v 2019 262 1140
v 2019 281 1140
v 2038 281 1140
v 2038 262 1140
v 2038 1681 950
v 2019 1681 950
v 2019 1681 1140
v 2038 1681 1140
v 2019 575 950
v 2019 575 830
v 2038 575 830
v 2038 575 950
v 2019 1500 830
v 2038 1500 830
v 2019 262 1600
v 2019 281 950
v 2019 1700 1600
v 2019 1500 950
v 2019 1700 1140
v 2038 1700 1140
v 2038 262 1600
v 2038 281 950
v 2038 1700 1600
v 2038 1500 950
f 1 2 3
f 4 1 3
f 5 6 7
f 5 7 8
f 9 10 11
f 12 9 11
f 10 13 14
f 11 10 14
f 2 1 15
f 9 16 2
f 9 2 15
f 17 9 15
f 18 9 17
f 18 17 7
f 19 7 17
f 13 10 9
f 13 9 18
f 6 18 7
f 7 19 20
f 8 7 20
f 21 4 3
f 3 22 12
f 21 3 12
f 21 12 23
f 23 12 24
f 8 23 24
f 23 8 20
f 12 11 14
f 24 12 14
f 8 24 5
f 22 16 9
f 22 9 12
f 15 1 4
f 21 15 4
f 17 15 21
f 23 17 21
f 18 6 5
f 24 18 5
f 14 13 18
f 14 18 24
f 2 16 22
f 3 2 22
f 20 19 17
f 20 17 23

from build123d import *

# Parameters (mm, degrees)
BOX023_W     = 19
BOX023_H     = 1400
BOX023_DEPTH = 190
BOX024_W     = 19
BOX024_H     = 1438
BOX024_DEPTH = 460
BOX021_W     = 19
BOX021_H     = 925
BOX021_DEPTH = 120


with BuildPart() as cube023:
    # Box023 → Box023 (new body)
    with BuildSketch(Plane(origin=(2019, 281, 950), x_dir=(1, 0, 0), z_dir=(0, 0, 1))):
        with Locations((9.5, 700)):
            Rectangle(BOX023_W, BOX023_H)
    extrude(amount=BOX023_DEPTH)


with BuildPart() as cube024:
    # Box024 → Box024 (new body)
    with BuildSketch(Plane(origin=(2019, 262, 1140), x_dir=(1, 0, 0), z_dir=(0, 0, 1))):
        with Locations((9.5, 719)):
            Rectangle(BOX024_W, BOX024_H)
    extrude(amount=BOX024_DEPTH)


with BuildPart() as headboard:
    # Box021 → Box021 (new body)
    with BuildSketch(Plane(origin=(2019, 575, 830), x_dir=(1, 0, 0), z_dir=(0, 0, 1))):
        with Locations((9.5, 462.5)):
            Rectangle(BOX021_W, BOX021_H)
    extrude(amount=BOX021_DEPTH)

    # Fusion: union Cube023, Cube024
    add(cube023.part)
    add(cube024.part)


solid = headboard.part
